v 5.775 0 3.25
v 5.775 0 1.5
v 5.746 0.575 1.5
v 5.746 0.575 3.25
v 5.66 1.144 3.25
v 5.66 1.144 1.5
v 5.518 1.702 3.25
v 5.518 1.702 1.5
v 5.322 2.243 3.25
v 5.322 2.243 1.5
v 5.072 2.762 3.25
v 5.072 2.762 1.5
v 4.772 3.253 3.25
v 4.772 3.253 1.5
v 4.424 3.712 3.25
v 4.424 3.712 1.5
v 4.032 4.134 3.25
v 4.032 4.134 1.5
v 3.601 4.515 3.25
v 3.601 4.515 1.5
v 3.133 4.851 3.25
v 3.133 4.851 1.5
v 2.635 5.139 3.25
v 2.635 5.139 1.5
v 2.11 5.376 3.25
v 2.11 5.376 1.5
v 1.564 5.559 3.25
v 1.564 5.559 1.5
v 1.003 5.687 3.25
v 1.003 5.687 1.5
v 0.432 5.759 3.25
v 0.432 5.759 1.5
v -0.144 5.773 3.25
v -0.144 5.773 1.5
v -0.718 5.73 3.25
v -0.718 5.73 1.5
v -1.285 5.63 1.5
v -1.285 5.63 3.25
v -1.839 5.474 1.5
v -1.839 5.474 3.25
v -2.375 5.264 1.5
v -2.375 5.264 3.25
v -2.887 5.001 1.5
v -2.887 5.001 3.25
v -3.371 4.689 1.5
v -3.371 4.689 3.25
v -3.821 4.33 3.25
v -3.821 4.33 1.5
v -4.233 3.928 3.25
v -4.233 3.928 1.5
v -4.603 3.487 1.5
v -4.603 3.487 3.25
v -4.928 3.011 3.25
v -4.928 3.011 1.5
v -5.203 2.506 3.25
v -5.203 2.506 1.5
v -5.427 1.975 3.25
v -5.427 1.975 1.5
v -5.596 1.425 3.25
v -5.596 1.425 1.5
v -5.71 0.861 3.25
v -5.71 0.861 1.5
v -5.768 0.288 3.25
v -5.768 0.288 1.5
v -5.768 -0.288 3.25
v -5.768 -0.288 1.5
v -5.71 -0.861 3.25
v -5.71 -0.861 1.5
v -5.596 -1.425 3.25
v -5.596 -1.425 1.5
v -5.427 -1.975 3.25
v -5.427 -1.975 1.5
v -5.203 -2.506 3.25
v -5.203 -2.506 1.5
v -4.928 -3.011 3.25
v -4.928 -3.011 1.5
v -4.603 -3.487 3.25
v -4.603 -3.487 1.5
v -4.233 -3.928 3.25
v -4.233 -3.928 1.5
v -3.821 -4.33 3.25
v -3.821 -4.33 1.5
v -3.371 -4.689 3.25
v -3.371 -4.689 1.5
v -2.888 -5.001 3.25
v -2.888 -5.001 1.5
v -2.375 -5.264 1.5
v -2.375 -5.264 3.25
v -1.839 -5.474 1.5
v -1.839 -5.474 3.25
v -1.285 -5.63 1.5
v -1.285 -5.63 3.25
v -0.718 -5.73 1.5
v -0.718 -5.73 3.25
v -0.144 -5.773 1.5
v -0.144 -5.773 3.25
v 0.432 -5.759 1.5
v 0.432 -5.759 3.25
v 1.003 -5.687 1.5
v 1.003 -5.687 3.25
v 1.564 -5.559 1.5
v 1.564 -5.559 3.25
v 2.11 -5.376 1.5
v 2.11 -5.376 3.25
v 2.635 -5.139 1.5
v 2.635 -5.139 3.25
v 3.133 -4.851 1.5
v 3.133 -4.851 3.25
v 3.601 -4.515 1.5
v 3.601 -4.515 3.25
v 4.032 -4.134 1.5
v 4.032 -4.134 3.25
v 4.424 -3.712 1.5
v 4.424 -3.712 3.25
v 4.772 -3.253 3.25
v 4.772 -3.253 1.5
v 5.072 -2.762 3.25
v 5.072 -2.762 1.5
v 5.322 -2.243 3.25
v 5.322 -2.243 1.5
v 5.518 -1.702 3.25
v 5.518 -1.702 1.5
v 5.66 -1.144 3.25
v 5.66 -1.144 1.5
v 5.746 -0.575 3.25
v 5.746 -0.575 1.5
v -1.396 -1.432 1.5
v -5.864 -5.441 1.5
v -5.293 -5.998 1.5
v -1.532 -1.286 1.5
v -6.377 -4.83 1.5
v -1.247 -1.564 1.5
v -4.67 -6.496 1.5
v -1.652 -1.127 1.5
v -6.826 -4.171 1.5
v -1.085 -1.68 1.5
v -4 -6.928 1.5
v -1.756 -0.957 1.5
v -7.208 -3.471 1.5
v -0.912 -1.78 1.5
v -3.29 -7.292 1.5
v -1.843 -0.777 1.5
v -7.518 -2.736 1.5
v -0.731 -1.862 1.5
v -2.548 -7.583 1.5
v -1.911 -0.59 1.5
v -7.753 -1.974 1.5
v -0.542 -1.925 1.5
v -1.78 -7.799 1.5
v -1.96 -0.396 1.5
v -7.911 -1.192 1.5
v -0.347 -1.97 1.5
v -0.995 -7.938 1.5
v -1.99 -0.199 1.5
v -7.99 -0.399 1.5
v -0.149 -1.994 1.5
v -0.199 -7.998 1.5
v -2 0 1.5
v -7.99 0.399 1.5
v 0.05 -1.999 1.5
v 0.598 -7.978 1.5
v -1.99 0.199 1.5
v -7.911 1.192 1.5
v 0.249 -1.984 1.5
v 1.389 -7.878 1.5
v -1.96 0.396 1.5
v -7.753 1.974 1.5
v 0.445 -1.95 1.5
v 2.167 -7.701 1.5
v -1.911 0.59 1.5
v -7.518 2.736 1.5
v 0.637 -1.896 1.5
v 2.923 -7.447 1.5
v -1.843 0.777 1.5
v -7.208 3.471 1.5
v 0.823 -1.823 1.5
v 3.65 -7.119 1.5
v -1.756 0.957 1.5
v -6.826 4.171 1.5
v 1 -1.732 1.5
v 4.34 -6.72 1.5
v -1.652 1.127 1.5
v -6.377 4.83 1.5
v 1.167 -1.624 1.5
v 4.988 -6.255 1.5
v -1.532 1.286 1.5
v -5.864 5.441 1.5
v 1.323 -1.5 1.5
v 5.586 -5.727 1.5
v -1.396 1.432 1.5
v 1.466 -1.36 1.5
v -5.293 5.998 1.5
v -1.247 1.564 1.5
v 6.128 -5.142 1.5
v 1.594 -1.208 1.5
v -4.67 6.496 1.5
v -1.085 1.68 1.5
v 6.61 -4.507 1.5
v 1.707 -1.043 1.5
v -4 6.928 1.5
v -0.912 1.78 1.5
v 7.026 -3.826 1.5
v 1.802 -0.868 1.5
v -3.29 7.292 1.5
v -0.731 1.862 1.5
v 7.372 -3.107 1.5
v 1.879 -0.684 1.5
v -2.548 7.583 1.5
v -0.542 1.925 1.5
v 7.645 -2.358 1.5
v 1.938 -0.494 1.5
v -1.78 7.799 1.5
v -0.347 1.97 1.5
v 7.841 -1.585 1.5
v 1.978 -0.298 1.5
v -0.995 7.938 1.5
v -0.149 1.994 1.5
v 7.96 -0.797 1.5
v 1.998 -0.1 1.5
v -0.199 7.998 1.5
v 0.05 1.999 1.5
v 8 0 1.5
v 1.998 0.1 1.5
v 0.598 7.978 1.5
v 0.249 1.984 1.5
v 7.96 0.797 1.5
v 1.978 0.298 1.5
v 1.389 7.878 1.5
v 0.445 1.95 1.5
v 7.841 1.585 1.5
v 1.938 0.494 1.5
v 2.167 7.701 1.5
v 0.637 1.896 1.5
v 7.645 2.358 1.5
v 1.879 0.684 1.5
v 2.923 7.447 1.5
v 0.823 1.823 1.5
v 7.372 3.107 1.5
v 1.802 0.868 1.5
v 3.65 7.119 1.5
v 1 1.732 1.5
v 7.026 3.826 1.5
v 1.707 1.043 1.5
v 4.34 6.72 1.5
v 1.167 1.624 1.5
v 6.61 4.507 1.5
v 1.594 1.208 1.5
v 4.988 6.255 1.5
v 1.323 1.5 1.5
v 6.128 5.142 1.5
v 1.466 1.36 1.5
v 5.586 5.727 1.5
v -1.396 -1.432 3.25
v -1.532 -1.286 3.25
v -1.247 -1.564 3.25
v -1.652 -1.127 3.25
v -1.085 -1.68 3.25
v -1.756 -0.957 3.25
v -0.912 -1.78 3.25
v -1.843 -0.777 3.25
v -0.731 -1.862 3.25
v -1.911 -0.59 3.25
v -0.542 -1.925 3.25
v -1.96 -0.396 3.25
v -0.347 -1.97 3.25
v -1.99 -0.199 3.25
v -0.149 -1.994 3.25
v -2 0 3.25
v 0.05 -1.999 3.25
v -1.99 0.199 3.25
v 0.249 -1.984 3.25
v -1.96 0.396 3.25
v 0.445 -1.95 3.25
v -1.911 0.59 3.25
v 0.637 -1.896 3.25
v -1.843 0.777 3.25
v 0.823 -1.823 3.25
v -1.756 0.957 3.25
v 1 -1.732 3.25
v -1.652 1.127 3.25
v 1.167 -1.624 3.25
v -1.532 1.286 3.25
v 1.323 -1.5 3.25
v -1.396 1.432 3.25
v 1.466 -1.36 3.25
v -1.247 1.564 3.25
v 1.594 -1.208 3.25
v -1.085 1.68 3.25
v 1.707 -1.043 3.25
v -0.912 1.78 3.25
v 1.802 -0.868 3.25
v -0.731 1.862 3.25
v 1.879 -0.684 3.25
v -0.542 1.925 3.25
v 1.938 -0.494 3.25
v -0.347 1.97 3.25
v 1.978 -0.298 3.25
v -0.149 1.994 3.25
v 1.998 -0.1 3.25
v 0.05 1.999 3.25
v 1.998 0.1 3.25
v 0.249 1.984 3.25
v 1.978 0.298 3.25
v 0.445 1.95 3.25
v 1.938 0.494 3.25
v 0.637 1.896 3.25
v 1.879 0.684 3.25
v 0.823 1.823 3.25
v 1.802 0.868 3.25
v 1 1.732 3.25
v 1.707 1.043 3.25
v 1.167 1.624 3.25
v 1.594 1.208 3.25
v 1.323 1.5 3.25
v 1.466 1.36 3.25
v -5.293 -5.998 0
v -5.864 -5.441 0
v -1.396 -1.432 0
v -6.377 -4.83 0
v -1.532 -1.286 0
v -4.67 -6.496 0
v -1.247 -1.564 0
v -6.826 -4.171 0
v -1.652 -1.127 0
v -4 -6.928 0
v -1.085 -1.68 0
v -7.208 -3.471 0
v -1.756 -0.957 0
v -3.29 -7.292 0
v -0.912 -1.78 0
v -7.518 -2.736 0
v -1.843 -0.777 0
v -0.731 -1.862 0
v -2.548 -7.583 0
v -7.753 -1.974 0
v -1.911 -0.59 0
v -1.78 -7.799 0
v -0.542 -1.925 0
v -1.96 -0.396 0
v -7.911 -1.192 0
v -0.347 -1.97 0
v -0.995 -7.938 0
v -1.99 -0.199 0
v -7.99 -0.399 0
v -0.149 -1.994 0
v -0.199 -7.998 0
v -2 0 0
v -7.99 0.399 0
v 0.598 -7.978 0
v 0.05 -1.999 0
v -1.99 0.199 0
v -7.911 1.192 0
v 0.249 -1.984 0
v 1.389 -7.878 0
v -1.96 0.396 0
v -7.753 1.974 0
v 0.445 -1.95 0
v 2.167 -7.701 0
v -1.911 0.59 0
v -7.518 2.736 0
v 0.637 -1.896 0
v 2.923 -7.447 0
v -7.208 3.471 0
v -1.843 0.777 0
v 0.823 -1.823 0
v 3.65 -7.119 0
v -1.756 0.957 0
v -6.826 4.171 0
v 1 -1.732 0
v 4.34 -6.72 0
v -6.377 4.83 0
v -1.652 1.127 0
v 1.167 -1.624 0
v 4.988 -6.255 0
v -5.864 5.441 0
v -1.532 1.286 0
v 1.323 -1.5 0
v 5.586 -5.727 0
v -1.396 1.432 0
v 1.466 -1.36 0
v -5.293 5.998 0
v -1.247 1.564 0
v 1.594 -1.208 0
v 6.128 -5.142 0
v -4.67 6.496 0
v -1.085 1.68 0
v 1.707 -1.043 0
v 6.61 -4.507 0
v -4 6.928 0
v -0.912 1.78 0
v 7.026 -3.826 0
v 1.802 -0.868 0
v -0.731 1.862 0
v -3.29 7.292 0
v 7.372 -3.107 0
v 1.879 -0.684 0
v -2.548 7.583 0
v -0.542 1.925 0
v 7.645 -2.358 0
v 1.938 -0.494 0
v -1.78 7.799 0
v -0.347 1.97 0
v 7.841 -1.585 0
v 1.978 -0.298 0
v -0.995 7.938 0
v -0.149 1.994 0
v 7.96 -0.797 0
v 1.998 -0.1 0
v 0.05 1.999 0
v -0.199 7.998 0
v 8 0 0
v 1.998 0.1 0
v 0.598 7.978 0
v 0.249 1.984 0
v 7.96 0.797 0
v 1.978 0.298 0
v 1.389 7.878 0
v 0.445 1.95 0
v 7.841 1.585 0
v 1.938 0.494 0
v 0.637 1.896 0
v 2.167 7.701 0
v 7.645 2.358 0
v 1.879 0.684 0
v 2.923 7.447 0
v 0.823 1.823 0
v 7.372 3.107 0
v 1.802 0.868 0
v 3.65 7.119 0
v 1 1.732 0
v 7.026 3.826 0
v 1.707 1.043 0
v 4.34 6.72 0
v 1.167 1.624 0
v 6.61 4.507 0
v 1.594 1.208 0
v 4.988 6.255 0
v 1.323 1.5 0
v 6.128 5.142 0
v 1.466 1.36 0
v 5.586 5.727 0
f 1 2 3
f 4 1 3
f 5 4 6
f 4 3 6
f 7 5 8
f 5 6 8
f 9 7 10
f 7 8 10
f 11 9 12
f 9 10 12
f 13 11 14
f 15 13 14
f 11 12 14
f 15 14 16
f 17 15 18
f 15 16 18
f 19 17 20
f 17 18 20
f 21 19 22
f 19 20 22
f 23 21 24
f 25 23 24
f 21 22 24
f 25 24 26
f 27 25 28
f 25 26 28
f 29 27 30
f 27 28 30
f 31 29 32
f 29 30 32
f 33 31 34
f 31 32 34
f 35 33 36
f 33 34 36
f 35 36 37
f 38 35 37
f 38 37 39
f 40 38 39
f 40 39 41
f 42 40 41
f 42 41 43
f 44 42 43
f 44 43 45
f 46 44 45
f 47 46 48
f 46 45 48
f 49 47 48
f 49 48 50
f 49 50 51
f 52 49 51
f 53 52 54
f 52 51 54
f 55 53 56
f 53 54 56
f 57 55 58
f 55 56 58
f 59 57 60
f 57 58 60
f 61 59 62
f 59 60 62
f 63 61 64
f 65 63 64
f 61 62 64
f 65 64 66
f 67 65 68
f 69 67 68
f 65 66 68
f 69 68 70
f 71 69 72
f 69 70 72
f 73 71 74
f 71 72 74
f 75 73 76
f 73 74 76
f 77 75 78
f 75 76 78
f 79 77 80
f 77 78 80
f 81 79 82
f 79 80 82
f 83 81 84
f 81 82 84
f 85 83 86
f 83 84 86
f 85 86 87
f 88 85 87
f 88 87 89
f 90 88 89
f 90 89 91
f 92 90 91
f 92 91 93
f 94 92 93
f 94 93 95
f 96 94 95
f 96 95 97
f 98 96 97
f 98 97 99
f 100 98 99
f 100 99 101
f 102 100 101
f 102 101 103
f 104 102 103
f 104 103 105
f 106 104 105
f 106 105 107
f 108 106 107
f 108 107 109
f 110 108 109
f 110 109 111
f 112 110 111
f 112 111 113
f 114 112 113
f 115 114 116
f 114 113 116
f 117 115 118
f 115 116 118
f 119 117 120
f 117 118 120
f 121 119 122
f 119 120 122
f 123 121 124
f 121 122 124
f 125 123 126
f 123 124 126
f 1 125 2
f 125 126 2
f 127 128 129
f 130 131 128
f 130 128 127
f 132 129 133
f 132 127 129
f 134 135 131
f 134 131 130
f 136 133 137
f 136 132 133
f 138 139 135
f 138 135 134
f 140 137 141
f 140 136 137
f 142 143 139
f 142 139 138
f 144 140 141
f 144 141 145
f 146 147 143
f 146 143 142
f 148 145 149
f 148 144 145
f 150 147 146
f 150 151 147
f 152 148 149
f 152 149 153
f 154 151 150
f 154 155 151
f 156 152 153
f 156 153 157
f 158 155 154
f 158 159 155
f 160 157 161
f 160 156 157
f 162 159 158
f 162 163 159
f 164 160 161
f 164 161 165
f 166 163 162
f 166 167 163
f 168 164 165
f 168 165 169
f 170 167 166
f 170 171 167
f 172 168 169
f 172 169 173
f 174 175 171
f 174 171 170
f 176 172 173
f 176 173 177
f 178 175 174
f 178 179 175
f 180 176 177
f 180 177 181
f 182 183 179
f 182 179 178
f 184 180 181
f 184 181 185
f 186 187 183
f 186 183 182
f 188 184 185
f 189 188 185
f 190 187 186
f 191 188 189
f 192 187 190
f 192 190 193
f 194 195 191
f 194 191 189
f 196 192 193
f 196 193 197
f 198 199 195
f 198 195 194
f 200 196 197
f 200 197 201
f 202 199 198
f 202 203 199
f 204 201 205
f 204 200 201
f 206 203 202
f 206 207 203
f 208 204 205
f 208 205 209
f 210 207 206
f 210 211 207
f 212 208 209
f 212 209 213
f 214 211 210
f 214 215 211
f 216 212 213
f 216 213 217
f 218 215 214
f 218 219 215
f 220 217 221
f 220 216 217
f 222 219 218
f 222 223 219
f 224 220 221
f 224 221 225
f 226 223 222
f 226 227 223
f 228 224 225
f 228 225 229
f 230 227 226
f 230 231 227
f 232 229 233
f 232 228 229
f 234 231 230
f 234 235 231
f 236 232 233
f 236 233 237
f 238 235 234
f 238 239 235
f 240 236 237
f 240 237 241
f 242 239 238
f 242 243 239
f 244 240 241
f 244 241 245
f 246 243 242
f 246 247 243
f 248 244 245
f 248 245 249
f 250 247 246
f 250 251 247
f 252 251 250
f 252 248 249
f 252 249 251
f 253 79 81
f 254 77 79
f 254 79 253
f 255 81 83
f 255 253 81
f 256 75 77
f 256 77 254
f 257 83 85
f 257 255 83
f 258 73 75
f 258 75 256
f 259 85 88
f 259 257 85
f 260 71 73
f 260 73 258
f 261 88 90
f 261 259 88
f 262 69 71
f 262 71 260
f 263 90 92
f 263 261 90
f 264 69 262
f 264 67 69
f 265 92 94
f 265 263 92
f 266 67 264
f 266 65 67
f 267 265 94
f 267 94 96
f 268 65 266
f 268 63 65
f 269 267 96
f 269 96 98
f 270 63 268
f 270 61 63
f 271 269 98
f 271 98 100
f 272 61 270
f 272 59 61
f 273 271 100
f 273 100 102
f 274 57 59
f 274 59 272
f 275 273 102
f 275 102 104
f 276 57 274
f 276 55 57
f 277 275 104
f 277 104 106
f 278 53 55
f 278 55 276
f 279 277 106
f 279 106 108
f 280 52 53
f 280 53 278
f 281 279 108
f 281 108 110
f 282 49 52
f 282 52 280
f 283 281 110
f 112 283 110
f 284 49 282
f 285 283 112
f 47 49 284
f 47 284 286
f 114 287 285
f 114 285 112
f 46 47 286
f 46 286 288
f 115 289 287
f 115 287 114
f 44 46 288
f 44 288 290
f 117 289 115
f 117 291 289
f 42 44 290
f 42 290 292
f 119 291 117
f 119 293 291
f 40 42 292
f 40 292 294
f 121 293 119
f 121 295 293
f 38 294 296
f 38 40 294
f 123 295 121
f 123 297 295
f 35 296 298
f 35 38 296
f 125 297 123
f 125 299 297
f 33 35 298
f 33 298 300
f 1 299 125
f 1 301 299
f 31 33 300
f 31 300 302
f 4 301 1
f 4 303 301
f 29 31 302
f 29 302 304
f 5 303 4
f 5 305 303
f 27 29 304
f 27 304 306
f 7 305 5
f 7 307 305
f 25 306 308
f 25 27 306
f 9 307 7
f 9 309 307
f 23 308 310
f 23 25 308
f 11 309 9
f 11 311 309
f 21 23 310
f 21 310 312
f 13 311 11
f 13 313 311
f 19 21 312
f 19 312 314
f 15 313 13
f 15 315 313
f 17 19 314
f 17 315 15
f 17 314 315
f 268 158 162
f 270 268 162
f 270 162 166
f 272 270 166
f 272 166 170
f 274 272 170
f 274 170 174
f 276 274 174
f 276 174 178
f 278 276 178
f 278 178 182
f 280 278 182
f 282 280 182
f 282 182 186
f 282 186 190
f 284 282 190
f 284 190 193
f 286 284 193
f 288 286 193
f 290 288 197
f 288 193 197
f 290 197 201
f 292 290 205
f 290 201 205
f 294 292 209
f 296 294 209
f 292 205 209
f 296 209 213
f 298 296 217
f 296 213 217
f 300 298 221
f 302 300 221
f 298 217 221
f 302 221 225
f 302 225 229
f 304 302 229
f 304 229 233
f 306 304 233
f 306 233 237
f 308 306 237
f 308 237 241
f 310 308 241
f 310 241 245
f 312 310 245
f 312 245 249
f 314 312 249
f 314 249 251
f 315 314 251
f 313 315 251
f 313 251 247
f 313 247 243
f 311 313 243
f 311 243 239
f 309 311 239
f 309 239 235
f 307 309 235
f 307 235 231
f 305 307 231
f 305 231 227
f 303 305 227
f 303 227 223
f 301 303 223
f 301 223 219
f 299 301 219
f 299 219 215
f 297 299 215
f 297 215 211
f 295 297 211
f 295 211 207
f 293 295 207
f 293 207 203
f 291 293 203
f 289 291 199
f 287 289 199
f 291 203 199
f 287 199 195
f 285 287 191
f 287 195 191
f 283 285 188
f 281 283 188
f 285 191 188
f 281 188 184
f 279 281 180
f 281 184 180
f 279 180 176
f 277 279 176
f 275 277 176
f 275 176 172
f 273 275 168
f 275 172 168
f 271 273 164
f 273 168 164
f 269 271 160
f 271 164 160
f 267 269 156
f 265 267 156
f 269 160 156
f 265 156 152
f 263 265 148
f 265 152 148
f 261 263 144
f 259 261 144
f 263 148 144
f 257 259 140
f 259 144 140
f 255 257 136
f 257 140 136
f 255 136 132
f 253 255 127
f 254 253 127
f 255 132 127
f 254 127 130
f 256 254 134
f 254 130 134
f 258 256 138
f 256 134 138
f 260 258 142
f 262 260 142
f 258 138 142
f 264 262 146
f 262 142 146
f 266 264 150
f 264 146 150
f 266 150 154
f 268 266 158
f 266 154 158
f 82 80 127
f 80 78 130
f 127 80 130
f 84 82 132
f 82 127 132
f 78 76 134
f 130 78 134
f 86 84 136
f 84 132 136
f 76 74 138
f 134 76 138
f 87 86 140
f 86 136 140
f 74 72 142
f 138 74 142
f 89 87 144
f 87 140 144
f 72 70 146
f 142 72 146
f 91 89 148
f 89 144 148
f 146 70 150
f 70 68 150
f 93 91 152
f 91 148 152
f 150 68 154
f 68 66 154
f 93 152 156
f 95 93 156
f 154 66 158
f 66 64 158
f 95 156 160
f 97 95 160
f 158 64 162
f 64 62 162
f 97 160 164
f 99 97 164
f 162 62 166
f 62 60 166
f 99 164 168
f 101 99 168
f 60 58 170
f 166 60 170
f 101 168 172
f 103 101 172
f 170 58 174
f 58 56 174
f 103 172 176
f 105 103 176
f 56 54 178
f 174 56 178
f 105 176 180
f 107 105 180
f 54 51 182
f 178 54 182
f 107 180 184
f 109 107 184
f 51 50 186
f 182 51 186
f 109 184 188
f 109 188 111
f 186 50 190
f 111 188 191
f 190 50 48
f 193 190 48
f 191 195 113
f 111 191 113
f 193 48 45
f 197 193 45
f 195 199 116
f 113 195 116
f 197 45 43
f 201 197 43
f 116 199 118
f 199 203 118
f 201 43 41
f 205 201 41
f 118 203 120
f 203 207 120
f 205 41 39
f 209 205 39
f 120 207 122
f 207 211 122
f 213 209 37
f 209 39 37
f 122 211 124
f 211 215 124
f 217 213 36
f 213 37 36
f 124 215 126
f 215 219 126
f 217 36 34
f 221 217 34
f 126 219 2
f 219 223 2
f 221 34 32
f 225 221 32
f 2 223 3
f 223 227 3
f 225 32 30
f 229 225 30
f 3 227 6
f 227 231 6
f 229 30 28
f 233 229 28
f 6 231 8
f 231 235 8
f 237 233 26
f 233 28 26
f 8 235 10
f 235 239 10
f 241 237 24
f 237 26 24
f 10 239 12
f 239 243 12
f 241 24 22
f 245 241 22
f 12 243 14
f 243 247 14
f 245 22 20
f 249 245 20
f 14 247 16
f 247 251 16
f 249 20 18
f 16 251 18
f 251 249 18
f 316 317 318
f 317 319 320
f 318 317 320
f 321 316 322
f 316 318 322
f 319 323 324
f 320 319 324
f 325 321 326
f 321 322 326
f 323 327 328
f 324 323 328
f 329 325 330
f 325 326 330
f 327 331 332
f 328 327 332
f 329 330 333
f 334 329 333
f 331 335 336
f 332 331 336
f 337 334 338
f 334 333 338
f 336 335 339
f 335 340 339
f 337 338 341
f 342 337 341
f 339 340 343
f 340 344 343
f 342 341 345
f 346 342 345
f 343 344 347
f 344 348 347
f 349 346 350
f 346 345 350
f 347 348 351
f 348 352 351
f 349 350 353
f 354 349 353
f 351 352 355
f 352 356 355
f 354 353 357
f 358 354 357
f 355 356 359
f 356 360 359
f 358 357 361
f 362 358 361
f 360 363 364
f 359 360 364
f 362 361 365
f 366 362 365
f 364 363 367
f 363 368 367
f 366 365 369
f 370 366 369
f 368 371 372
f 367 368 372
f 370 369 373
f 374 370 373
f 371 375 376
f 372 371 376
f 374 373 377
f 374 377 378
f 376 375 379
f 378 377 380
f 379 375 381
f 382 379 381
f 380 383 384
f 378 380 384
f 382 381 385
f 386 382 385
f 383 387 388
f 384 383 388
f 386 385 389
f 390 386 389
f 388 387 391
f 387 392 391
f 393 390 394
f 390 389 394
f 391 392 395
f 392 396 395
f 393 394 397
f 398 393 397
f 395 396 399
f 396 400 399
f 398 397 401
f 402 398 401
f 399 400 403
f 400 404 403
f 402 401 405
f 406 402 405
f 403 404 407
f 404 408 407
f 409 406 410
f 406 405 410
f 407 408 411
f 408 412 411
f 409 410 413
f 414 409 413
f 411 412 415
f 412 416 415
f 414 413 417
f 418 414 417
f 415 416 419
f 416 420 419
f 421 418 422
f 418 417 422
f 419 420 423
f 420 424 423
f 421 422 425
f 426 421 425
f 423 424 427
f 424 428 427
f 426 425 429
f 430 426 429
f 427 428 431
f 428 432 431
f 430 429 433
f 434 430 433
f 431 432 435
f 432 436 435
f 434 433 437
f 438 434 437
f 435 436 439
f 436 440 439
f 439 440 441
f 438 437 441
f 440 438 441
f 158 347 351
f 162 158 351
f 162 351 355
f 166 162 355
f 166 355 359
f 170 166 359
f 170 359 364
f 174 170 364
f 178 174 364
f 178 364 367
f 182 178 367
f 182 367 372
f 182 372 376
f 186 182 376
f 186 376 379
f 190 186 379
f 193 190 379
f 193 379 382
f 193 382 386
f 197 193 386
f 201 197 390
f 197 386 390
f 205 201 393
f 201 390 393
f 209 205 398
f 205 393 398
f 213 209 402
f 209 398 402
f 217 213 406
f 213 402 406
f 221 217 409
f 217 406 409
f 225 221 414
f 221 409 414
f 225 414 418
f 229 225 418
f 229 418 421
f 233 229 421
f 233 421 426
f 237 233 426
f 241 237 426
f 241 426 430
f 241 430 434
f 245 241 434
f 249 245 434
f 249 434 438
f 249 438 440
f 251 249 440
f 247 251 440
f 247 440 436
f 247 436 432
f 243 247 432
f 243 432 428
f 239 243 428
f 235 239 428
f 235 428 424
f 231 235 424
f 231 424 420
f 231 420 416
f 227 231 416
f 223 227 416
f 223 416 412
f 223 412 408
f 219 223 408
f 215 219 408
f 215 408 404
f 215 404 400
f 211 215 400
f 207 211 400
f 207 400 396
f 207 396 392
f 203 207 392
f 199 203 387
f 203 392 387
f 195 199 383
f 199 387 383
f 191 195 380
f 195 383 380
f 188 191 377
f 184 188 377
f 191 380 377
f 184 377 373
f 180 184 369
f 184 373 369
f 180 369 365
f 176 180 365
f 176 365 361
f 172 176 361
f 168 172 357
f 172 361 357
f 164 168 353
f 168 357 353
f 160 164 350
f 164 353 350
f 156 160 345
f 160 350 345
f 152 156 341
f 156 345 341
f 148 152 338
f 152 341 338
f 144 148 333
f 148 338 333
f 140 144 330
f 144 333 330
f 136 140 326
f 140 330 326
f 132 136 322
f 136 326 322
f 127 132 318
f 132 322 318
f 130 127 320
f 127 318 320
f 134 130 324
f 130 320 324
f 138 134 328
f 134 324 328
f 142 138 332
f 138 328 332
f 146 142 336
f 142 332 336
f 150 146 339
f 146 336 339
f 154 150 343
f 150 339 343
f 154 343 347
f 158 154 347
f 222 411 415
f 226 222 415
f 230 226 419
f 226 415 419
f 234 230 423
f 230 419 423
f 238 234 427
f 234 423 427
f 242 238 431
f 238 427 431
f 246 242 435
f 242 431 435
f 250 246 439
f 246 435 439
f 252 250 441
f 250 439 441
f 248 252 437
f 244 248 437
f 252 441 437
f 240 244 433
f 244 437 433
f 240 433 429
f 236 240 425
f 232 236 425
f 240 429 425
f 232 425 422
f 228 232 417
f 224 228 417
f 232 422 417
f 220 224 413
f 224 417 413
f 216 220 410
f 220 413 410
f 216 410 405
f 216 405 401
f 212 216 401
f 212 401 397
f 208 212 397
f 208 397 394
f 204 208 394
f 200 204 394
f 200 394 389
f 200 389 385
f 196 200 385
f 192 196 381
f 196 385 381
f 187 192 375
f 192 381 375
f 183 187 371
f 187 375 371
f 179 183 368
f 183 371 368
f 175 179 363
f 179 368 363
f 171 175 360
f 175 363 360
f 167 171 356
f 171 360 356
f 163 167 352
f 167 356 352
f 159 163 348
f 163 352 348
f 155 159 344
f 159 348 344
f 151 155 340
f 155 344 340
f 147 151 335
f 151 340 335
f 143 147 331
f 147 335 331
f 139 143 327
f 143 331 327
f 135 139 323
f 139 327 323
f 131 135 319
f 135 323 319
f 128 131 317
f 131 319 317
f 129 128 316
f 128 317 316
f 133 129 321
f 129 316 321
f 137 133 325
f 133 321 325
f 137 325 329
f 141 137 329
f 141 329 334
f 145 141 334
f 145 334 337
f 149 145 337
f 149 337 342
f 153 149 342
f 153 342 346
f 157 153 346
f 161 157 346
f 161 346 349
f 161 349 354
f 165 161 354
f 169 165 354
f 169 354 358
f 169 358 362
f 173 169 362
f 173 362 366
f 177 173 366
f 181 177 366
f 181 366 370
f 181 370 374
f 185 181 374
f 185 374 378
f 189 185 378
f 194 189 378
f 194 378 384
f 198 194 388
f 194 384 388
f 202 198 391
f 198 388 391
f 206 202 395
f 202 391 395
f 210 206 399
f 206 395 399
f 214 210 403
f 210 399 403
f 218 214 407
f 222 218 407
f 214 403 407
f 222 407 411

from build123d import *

# Parameters (mm, degrees)
F0_R     = 8
F1_DEPTH = 1.5
F2_R     = 5.775
F3_DEPTH = 1.75
F5_D     = 4
F5_2_D   = 4


with BuildPart() as f1:
    # F0 (on Top) → F1 (new body)
    with BuildSketch(Plane.XY):
        Circle(F0_R)
    extrude(amount=F1_DEPTH)

    # F5 (through all)
    with Locations(Plane.XY.offset(3.25)):
        with Locations((0, 0)):
            Hole(F5_D / 2)


with BuildPart() as f3:
    # F2 (on face) → F3 (new body)
    with BuildSketch(Plane.XY.offset(1.5)):
        Circle(F2_R)
    extrude(amount=F3_DEPTH)

    # F5#2 (through all)
    with Locations(Plane.XY.offset(3.25)):
        with Locations((0, 0)):
            Hole(F5_2_D / 2)


solid = Compound([f1.part, f3.part])
